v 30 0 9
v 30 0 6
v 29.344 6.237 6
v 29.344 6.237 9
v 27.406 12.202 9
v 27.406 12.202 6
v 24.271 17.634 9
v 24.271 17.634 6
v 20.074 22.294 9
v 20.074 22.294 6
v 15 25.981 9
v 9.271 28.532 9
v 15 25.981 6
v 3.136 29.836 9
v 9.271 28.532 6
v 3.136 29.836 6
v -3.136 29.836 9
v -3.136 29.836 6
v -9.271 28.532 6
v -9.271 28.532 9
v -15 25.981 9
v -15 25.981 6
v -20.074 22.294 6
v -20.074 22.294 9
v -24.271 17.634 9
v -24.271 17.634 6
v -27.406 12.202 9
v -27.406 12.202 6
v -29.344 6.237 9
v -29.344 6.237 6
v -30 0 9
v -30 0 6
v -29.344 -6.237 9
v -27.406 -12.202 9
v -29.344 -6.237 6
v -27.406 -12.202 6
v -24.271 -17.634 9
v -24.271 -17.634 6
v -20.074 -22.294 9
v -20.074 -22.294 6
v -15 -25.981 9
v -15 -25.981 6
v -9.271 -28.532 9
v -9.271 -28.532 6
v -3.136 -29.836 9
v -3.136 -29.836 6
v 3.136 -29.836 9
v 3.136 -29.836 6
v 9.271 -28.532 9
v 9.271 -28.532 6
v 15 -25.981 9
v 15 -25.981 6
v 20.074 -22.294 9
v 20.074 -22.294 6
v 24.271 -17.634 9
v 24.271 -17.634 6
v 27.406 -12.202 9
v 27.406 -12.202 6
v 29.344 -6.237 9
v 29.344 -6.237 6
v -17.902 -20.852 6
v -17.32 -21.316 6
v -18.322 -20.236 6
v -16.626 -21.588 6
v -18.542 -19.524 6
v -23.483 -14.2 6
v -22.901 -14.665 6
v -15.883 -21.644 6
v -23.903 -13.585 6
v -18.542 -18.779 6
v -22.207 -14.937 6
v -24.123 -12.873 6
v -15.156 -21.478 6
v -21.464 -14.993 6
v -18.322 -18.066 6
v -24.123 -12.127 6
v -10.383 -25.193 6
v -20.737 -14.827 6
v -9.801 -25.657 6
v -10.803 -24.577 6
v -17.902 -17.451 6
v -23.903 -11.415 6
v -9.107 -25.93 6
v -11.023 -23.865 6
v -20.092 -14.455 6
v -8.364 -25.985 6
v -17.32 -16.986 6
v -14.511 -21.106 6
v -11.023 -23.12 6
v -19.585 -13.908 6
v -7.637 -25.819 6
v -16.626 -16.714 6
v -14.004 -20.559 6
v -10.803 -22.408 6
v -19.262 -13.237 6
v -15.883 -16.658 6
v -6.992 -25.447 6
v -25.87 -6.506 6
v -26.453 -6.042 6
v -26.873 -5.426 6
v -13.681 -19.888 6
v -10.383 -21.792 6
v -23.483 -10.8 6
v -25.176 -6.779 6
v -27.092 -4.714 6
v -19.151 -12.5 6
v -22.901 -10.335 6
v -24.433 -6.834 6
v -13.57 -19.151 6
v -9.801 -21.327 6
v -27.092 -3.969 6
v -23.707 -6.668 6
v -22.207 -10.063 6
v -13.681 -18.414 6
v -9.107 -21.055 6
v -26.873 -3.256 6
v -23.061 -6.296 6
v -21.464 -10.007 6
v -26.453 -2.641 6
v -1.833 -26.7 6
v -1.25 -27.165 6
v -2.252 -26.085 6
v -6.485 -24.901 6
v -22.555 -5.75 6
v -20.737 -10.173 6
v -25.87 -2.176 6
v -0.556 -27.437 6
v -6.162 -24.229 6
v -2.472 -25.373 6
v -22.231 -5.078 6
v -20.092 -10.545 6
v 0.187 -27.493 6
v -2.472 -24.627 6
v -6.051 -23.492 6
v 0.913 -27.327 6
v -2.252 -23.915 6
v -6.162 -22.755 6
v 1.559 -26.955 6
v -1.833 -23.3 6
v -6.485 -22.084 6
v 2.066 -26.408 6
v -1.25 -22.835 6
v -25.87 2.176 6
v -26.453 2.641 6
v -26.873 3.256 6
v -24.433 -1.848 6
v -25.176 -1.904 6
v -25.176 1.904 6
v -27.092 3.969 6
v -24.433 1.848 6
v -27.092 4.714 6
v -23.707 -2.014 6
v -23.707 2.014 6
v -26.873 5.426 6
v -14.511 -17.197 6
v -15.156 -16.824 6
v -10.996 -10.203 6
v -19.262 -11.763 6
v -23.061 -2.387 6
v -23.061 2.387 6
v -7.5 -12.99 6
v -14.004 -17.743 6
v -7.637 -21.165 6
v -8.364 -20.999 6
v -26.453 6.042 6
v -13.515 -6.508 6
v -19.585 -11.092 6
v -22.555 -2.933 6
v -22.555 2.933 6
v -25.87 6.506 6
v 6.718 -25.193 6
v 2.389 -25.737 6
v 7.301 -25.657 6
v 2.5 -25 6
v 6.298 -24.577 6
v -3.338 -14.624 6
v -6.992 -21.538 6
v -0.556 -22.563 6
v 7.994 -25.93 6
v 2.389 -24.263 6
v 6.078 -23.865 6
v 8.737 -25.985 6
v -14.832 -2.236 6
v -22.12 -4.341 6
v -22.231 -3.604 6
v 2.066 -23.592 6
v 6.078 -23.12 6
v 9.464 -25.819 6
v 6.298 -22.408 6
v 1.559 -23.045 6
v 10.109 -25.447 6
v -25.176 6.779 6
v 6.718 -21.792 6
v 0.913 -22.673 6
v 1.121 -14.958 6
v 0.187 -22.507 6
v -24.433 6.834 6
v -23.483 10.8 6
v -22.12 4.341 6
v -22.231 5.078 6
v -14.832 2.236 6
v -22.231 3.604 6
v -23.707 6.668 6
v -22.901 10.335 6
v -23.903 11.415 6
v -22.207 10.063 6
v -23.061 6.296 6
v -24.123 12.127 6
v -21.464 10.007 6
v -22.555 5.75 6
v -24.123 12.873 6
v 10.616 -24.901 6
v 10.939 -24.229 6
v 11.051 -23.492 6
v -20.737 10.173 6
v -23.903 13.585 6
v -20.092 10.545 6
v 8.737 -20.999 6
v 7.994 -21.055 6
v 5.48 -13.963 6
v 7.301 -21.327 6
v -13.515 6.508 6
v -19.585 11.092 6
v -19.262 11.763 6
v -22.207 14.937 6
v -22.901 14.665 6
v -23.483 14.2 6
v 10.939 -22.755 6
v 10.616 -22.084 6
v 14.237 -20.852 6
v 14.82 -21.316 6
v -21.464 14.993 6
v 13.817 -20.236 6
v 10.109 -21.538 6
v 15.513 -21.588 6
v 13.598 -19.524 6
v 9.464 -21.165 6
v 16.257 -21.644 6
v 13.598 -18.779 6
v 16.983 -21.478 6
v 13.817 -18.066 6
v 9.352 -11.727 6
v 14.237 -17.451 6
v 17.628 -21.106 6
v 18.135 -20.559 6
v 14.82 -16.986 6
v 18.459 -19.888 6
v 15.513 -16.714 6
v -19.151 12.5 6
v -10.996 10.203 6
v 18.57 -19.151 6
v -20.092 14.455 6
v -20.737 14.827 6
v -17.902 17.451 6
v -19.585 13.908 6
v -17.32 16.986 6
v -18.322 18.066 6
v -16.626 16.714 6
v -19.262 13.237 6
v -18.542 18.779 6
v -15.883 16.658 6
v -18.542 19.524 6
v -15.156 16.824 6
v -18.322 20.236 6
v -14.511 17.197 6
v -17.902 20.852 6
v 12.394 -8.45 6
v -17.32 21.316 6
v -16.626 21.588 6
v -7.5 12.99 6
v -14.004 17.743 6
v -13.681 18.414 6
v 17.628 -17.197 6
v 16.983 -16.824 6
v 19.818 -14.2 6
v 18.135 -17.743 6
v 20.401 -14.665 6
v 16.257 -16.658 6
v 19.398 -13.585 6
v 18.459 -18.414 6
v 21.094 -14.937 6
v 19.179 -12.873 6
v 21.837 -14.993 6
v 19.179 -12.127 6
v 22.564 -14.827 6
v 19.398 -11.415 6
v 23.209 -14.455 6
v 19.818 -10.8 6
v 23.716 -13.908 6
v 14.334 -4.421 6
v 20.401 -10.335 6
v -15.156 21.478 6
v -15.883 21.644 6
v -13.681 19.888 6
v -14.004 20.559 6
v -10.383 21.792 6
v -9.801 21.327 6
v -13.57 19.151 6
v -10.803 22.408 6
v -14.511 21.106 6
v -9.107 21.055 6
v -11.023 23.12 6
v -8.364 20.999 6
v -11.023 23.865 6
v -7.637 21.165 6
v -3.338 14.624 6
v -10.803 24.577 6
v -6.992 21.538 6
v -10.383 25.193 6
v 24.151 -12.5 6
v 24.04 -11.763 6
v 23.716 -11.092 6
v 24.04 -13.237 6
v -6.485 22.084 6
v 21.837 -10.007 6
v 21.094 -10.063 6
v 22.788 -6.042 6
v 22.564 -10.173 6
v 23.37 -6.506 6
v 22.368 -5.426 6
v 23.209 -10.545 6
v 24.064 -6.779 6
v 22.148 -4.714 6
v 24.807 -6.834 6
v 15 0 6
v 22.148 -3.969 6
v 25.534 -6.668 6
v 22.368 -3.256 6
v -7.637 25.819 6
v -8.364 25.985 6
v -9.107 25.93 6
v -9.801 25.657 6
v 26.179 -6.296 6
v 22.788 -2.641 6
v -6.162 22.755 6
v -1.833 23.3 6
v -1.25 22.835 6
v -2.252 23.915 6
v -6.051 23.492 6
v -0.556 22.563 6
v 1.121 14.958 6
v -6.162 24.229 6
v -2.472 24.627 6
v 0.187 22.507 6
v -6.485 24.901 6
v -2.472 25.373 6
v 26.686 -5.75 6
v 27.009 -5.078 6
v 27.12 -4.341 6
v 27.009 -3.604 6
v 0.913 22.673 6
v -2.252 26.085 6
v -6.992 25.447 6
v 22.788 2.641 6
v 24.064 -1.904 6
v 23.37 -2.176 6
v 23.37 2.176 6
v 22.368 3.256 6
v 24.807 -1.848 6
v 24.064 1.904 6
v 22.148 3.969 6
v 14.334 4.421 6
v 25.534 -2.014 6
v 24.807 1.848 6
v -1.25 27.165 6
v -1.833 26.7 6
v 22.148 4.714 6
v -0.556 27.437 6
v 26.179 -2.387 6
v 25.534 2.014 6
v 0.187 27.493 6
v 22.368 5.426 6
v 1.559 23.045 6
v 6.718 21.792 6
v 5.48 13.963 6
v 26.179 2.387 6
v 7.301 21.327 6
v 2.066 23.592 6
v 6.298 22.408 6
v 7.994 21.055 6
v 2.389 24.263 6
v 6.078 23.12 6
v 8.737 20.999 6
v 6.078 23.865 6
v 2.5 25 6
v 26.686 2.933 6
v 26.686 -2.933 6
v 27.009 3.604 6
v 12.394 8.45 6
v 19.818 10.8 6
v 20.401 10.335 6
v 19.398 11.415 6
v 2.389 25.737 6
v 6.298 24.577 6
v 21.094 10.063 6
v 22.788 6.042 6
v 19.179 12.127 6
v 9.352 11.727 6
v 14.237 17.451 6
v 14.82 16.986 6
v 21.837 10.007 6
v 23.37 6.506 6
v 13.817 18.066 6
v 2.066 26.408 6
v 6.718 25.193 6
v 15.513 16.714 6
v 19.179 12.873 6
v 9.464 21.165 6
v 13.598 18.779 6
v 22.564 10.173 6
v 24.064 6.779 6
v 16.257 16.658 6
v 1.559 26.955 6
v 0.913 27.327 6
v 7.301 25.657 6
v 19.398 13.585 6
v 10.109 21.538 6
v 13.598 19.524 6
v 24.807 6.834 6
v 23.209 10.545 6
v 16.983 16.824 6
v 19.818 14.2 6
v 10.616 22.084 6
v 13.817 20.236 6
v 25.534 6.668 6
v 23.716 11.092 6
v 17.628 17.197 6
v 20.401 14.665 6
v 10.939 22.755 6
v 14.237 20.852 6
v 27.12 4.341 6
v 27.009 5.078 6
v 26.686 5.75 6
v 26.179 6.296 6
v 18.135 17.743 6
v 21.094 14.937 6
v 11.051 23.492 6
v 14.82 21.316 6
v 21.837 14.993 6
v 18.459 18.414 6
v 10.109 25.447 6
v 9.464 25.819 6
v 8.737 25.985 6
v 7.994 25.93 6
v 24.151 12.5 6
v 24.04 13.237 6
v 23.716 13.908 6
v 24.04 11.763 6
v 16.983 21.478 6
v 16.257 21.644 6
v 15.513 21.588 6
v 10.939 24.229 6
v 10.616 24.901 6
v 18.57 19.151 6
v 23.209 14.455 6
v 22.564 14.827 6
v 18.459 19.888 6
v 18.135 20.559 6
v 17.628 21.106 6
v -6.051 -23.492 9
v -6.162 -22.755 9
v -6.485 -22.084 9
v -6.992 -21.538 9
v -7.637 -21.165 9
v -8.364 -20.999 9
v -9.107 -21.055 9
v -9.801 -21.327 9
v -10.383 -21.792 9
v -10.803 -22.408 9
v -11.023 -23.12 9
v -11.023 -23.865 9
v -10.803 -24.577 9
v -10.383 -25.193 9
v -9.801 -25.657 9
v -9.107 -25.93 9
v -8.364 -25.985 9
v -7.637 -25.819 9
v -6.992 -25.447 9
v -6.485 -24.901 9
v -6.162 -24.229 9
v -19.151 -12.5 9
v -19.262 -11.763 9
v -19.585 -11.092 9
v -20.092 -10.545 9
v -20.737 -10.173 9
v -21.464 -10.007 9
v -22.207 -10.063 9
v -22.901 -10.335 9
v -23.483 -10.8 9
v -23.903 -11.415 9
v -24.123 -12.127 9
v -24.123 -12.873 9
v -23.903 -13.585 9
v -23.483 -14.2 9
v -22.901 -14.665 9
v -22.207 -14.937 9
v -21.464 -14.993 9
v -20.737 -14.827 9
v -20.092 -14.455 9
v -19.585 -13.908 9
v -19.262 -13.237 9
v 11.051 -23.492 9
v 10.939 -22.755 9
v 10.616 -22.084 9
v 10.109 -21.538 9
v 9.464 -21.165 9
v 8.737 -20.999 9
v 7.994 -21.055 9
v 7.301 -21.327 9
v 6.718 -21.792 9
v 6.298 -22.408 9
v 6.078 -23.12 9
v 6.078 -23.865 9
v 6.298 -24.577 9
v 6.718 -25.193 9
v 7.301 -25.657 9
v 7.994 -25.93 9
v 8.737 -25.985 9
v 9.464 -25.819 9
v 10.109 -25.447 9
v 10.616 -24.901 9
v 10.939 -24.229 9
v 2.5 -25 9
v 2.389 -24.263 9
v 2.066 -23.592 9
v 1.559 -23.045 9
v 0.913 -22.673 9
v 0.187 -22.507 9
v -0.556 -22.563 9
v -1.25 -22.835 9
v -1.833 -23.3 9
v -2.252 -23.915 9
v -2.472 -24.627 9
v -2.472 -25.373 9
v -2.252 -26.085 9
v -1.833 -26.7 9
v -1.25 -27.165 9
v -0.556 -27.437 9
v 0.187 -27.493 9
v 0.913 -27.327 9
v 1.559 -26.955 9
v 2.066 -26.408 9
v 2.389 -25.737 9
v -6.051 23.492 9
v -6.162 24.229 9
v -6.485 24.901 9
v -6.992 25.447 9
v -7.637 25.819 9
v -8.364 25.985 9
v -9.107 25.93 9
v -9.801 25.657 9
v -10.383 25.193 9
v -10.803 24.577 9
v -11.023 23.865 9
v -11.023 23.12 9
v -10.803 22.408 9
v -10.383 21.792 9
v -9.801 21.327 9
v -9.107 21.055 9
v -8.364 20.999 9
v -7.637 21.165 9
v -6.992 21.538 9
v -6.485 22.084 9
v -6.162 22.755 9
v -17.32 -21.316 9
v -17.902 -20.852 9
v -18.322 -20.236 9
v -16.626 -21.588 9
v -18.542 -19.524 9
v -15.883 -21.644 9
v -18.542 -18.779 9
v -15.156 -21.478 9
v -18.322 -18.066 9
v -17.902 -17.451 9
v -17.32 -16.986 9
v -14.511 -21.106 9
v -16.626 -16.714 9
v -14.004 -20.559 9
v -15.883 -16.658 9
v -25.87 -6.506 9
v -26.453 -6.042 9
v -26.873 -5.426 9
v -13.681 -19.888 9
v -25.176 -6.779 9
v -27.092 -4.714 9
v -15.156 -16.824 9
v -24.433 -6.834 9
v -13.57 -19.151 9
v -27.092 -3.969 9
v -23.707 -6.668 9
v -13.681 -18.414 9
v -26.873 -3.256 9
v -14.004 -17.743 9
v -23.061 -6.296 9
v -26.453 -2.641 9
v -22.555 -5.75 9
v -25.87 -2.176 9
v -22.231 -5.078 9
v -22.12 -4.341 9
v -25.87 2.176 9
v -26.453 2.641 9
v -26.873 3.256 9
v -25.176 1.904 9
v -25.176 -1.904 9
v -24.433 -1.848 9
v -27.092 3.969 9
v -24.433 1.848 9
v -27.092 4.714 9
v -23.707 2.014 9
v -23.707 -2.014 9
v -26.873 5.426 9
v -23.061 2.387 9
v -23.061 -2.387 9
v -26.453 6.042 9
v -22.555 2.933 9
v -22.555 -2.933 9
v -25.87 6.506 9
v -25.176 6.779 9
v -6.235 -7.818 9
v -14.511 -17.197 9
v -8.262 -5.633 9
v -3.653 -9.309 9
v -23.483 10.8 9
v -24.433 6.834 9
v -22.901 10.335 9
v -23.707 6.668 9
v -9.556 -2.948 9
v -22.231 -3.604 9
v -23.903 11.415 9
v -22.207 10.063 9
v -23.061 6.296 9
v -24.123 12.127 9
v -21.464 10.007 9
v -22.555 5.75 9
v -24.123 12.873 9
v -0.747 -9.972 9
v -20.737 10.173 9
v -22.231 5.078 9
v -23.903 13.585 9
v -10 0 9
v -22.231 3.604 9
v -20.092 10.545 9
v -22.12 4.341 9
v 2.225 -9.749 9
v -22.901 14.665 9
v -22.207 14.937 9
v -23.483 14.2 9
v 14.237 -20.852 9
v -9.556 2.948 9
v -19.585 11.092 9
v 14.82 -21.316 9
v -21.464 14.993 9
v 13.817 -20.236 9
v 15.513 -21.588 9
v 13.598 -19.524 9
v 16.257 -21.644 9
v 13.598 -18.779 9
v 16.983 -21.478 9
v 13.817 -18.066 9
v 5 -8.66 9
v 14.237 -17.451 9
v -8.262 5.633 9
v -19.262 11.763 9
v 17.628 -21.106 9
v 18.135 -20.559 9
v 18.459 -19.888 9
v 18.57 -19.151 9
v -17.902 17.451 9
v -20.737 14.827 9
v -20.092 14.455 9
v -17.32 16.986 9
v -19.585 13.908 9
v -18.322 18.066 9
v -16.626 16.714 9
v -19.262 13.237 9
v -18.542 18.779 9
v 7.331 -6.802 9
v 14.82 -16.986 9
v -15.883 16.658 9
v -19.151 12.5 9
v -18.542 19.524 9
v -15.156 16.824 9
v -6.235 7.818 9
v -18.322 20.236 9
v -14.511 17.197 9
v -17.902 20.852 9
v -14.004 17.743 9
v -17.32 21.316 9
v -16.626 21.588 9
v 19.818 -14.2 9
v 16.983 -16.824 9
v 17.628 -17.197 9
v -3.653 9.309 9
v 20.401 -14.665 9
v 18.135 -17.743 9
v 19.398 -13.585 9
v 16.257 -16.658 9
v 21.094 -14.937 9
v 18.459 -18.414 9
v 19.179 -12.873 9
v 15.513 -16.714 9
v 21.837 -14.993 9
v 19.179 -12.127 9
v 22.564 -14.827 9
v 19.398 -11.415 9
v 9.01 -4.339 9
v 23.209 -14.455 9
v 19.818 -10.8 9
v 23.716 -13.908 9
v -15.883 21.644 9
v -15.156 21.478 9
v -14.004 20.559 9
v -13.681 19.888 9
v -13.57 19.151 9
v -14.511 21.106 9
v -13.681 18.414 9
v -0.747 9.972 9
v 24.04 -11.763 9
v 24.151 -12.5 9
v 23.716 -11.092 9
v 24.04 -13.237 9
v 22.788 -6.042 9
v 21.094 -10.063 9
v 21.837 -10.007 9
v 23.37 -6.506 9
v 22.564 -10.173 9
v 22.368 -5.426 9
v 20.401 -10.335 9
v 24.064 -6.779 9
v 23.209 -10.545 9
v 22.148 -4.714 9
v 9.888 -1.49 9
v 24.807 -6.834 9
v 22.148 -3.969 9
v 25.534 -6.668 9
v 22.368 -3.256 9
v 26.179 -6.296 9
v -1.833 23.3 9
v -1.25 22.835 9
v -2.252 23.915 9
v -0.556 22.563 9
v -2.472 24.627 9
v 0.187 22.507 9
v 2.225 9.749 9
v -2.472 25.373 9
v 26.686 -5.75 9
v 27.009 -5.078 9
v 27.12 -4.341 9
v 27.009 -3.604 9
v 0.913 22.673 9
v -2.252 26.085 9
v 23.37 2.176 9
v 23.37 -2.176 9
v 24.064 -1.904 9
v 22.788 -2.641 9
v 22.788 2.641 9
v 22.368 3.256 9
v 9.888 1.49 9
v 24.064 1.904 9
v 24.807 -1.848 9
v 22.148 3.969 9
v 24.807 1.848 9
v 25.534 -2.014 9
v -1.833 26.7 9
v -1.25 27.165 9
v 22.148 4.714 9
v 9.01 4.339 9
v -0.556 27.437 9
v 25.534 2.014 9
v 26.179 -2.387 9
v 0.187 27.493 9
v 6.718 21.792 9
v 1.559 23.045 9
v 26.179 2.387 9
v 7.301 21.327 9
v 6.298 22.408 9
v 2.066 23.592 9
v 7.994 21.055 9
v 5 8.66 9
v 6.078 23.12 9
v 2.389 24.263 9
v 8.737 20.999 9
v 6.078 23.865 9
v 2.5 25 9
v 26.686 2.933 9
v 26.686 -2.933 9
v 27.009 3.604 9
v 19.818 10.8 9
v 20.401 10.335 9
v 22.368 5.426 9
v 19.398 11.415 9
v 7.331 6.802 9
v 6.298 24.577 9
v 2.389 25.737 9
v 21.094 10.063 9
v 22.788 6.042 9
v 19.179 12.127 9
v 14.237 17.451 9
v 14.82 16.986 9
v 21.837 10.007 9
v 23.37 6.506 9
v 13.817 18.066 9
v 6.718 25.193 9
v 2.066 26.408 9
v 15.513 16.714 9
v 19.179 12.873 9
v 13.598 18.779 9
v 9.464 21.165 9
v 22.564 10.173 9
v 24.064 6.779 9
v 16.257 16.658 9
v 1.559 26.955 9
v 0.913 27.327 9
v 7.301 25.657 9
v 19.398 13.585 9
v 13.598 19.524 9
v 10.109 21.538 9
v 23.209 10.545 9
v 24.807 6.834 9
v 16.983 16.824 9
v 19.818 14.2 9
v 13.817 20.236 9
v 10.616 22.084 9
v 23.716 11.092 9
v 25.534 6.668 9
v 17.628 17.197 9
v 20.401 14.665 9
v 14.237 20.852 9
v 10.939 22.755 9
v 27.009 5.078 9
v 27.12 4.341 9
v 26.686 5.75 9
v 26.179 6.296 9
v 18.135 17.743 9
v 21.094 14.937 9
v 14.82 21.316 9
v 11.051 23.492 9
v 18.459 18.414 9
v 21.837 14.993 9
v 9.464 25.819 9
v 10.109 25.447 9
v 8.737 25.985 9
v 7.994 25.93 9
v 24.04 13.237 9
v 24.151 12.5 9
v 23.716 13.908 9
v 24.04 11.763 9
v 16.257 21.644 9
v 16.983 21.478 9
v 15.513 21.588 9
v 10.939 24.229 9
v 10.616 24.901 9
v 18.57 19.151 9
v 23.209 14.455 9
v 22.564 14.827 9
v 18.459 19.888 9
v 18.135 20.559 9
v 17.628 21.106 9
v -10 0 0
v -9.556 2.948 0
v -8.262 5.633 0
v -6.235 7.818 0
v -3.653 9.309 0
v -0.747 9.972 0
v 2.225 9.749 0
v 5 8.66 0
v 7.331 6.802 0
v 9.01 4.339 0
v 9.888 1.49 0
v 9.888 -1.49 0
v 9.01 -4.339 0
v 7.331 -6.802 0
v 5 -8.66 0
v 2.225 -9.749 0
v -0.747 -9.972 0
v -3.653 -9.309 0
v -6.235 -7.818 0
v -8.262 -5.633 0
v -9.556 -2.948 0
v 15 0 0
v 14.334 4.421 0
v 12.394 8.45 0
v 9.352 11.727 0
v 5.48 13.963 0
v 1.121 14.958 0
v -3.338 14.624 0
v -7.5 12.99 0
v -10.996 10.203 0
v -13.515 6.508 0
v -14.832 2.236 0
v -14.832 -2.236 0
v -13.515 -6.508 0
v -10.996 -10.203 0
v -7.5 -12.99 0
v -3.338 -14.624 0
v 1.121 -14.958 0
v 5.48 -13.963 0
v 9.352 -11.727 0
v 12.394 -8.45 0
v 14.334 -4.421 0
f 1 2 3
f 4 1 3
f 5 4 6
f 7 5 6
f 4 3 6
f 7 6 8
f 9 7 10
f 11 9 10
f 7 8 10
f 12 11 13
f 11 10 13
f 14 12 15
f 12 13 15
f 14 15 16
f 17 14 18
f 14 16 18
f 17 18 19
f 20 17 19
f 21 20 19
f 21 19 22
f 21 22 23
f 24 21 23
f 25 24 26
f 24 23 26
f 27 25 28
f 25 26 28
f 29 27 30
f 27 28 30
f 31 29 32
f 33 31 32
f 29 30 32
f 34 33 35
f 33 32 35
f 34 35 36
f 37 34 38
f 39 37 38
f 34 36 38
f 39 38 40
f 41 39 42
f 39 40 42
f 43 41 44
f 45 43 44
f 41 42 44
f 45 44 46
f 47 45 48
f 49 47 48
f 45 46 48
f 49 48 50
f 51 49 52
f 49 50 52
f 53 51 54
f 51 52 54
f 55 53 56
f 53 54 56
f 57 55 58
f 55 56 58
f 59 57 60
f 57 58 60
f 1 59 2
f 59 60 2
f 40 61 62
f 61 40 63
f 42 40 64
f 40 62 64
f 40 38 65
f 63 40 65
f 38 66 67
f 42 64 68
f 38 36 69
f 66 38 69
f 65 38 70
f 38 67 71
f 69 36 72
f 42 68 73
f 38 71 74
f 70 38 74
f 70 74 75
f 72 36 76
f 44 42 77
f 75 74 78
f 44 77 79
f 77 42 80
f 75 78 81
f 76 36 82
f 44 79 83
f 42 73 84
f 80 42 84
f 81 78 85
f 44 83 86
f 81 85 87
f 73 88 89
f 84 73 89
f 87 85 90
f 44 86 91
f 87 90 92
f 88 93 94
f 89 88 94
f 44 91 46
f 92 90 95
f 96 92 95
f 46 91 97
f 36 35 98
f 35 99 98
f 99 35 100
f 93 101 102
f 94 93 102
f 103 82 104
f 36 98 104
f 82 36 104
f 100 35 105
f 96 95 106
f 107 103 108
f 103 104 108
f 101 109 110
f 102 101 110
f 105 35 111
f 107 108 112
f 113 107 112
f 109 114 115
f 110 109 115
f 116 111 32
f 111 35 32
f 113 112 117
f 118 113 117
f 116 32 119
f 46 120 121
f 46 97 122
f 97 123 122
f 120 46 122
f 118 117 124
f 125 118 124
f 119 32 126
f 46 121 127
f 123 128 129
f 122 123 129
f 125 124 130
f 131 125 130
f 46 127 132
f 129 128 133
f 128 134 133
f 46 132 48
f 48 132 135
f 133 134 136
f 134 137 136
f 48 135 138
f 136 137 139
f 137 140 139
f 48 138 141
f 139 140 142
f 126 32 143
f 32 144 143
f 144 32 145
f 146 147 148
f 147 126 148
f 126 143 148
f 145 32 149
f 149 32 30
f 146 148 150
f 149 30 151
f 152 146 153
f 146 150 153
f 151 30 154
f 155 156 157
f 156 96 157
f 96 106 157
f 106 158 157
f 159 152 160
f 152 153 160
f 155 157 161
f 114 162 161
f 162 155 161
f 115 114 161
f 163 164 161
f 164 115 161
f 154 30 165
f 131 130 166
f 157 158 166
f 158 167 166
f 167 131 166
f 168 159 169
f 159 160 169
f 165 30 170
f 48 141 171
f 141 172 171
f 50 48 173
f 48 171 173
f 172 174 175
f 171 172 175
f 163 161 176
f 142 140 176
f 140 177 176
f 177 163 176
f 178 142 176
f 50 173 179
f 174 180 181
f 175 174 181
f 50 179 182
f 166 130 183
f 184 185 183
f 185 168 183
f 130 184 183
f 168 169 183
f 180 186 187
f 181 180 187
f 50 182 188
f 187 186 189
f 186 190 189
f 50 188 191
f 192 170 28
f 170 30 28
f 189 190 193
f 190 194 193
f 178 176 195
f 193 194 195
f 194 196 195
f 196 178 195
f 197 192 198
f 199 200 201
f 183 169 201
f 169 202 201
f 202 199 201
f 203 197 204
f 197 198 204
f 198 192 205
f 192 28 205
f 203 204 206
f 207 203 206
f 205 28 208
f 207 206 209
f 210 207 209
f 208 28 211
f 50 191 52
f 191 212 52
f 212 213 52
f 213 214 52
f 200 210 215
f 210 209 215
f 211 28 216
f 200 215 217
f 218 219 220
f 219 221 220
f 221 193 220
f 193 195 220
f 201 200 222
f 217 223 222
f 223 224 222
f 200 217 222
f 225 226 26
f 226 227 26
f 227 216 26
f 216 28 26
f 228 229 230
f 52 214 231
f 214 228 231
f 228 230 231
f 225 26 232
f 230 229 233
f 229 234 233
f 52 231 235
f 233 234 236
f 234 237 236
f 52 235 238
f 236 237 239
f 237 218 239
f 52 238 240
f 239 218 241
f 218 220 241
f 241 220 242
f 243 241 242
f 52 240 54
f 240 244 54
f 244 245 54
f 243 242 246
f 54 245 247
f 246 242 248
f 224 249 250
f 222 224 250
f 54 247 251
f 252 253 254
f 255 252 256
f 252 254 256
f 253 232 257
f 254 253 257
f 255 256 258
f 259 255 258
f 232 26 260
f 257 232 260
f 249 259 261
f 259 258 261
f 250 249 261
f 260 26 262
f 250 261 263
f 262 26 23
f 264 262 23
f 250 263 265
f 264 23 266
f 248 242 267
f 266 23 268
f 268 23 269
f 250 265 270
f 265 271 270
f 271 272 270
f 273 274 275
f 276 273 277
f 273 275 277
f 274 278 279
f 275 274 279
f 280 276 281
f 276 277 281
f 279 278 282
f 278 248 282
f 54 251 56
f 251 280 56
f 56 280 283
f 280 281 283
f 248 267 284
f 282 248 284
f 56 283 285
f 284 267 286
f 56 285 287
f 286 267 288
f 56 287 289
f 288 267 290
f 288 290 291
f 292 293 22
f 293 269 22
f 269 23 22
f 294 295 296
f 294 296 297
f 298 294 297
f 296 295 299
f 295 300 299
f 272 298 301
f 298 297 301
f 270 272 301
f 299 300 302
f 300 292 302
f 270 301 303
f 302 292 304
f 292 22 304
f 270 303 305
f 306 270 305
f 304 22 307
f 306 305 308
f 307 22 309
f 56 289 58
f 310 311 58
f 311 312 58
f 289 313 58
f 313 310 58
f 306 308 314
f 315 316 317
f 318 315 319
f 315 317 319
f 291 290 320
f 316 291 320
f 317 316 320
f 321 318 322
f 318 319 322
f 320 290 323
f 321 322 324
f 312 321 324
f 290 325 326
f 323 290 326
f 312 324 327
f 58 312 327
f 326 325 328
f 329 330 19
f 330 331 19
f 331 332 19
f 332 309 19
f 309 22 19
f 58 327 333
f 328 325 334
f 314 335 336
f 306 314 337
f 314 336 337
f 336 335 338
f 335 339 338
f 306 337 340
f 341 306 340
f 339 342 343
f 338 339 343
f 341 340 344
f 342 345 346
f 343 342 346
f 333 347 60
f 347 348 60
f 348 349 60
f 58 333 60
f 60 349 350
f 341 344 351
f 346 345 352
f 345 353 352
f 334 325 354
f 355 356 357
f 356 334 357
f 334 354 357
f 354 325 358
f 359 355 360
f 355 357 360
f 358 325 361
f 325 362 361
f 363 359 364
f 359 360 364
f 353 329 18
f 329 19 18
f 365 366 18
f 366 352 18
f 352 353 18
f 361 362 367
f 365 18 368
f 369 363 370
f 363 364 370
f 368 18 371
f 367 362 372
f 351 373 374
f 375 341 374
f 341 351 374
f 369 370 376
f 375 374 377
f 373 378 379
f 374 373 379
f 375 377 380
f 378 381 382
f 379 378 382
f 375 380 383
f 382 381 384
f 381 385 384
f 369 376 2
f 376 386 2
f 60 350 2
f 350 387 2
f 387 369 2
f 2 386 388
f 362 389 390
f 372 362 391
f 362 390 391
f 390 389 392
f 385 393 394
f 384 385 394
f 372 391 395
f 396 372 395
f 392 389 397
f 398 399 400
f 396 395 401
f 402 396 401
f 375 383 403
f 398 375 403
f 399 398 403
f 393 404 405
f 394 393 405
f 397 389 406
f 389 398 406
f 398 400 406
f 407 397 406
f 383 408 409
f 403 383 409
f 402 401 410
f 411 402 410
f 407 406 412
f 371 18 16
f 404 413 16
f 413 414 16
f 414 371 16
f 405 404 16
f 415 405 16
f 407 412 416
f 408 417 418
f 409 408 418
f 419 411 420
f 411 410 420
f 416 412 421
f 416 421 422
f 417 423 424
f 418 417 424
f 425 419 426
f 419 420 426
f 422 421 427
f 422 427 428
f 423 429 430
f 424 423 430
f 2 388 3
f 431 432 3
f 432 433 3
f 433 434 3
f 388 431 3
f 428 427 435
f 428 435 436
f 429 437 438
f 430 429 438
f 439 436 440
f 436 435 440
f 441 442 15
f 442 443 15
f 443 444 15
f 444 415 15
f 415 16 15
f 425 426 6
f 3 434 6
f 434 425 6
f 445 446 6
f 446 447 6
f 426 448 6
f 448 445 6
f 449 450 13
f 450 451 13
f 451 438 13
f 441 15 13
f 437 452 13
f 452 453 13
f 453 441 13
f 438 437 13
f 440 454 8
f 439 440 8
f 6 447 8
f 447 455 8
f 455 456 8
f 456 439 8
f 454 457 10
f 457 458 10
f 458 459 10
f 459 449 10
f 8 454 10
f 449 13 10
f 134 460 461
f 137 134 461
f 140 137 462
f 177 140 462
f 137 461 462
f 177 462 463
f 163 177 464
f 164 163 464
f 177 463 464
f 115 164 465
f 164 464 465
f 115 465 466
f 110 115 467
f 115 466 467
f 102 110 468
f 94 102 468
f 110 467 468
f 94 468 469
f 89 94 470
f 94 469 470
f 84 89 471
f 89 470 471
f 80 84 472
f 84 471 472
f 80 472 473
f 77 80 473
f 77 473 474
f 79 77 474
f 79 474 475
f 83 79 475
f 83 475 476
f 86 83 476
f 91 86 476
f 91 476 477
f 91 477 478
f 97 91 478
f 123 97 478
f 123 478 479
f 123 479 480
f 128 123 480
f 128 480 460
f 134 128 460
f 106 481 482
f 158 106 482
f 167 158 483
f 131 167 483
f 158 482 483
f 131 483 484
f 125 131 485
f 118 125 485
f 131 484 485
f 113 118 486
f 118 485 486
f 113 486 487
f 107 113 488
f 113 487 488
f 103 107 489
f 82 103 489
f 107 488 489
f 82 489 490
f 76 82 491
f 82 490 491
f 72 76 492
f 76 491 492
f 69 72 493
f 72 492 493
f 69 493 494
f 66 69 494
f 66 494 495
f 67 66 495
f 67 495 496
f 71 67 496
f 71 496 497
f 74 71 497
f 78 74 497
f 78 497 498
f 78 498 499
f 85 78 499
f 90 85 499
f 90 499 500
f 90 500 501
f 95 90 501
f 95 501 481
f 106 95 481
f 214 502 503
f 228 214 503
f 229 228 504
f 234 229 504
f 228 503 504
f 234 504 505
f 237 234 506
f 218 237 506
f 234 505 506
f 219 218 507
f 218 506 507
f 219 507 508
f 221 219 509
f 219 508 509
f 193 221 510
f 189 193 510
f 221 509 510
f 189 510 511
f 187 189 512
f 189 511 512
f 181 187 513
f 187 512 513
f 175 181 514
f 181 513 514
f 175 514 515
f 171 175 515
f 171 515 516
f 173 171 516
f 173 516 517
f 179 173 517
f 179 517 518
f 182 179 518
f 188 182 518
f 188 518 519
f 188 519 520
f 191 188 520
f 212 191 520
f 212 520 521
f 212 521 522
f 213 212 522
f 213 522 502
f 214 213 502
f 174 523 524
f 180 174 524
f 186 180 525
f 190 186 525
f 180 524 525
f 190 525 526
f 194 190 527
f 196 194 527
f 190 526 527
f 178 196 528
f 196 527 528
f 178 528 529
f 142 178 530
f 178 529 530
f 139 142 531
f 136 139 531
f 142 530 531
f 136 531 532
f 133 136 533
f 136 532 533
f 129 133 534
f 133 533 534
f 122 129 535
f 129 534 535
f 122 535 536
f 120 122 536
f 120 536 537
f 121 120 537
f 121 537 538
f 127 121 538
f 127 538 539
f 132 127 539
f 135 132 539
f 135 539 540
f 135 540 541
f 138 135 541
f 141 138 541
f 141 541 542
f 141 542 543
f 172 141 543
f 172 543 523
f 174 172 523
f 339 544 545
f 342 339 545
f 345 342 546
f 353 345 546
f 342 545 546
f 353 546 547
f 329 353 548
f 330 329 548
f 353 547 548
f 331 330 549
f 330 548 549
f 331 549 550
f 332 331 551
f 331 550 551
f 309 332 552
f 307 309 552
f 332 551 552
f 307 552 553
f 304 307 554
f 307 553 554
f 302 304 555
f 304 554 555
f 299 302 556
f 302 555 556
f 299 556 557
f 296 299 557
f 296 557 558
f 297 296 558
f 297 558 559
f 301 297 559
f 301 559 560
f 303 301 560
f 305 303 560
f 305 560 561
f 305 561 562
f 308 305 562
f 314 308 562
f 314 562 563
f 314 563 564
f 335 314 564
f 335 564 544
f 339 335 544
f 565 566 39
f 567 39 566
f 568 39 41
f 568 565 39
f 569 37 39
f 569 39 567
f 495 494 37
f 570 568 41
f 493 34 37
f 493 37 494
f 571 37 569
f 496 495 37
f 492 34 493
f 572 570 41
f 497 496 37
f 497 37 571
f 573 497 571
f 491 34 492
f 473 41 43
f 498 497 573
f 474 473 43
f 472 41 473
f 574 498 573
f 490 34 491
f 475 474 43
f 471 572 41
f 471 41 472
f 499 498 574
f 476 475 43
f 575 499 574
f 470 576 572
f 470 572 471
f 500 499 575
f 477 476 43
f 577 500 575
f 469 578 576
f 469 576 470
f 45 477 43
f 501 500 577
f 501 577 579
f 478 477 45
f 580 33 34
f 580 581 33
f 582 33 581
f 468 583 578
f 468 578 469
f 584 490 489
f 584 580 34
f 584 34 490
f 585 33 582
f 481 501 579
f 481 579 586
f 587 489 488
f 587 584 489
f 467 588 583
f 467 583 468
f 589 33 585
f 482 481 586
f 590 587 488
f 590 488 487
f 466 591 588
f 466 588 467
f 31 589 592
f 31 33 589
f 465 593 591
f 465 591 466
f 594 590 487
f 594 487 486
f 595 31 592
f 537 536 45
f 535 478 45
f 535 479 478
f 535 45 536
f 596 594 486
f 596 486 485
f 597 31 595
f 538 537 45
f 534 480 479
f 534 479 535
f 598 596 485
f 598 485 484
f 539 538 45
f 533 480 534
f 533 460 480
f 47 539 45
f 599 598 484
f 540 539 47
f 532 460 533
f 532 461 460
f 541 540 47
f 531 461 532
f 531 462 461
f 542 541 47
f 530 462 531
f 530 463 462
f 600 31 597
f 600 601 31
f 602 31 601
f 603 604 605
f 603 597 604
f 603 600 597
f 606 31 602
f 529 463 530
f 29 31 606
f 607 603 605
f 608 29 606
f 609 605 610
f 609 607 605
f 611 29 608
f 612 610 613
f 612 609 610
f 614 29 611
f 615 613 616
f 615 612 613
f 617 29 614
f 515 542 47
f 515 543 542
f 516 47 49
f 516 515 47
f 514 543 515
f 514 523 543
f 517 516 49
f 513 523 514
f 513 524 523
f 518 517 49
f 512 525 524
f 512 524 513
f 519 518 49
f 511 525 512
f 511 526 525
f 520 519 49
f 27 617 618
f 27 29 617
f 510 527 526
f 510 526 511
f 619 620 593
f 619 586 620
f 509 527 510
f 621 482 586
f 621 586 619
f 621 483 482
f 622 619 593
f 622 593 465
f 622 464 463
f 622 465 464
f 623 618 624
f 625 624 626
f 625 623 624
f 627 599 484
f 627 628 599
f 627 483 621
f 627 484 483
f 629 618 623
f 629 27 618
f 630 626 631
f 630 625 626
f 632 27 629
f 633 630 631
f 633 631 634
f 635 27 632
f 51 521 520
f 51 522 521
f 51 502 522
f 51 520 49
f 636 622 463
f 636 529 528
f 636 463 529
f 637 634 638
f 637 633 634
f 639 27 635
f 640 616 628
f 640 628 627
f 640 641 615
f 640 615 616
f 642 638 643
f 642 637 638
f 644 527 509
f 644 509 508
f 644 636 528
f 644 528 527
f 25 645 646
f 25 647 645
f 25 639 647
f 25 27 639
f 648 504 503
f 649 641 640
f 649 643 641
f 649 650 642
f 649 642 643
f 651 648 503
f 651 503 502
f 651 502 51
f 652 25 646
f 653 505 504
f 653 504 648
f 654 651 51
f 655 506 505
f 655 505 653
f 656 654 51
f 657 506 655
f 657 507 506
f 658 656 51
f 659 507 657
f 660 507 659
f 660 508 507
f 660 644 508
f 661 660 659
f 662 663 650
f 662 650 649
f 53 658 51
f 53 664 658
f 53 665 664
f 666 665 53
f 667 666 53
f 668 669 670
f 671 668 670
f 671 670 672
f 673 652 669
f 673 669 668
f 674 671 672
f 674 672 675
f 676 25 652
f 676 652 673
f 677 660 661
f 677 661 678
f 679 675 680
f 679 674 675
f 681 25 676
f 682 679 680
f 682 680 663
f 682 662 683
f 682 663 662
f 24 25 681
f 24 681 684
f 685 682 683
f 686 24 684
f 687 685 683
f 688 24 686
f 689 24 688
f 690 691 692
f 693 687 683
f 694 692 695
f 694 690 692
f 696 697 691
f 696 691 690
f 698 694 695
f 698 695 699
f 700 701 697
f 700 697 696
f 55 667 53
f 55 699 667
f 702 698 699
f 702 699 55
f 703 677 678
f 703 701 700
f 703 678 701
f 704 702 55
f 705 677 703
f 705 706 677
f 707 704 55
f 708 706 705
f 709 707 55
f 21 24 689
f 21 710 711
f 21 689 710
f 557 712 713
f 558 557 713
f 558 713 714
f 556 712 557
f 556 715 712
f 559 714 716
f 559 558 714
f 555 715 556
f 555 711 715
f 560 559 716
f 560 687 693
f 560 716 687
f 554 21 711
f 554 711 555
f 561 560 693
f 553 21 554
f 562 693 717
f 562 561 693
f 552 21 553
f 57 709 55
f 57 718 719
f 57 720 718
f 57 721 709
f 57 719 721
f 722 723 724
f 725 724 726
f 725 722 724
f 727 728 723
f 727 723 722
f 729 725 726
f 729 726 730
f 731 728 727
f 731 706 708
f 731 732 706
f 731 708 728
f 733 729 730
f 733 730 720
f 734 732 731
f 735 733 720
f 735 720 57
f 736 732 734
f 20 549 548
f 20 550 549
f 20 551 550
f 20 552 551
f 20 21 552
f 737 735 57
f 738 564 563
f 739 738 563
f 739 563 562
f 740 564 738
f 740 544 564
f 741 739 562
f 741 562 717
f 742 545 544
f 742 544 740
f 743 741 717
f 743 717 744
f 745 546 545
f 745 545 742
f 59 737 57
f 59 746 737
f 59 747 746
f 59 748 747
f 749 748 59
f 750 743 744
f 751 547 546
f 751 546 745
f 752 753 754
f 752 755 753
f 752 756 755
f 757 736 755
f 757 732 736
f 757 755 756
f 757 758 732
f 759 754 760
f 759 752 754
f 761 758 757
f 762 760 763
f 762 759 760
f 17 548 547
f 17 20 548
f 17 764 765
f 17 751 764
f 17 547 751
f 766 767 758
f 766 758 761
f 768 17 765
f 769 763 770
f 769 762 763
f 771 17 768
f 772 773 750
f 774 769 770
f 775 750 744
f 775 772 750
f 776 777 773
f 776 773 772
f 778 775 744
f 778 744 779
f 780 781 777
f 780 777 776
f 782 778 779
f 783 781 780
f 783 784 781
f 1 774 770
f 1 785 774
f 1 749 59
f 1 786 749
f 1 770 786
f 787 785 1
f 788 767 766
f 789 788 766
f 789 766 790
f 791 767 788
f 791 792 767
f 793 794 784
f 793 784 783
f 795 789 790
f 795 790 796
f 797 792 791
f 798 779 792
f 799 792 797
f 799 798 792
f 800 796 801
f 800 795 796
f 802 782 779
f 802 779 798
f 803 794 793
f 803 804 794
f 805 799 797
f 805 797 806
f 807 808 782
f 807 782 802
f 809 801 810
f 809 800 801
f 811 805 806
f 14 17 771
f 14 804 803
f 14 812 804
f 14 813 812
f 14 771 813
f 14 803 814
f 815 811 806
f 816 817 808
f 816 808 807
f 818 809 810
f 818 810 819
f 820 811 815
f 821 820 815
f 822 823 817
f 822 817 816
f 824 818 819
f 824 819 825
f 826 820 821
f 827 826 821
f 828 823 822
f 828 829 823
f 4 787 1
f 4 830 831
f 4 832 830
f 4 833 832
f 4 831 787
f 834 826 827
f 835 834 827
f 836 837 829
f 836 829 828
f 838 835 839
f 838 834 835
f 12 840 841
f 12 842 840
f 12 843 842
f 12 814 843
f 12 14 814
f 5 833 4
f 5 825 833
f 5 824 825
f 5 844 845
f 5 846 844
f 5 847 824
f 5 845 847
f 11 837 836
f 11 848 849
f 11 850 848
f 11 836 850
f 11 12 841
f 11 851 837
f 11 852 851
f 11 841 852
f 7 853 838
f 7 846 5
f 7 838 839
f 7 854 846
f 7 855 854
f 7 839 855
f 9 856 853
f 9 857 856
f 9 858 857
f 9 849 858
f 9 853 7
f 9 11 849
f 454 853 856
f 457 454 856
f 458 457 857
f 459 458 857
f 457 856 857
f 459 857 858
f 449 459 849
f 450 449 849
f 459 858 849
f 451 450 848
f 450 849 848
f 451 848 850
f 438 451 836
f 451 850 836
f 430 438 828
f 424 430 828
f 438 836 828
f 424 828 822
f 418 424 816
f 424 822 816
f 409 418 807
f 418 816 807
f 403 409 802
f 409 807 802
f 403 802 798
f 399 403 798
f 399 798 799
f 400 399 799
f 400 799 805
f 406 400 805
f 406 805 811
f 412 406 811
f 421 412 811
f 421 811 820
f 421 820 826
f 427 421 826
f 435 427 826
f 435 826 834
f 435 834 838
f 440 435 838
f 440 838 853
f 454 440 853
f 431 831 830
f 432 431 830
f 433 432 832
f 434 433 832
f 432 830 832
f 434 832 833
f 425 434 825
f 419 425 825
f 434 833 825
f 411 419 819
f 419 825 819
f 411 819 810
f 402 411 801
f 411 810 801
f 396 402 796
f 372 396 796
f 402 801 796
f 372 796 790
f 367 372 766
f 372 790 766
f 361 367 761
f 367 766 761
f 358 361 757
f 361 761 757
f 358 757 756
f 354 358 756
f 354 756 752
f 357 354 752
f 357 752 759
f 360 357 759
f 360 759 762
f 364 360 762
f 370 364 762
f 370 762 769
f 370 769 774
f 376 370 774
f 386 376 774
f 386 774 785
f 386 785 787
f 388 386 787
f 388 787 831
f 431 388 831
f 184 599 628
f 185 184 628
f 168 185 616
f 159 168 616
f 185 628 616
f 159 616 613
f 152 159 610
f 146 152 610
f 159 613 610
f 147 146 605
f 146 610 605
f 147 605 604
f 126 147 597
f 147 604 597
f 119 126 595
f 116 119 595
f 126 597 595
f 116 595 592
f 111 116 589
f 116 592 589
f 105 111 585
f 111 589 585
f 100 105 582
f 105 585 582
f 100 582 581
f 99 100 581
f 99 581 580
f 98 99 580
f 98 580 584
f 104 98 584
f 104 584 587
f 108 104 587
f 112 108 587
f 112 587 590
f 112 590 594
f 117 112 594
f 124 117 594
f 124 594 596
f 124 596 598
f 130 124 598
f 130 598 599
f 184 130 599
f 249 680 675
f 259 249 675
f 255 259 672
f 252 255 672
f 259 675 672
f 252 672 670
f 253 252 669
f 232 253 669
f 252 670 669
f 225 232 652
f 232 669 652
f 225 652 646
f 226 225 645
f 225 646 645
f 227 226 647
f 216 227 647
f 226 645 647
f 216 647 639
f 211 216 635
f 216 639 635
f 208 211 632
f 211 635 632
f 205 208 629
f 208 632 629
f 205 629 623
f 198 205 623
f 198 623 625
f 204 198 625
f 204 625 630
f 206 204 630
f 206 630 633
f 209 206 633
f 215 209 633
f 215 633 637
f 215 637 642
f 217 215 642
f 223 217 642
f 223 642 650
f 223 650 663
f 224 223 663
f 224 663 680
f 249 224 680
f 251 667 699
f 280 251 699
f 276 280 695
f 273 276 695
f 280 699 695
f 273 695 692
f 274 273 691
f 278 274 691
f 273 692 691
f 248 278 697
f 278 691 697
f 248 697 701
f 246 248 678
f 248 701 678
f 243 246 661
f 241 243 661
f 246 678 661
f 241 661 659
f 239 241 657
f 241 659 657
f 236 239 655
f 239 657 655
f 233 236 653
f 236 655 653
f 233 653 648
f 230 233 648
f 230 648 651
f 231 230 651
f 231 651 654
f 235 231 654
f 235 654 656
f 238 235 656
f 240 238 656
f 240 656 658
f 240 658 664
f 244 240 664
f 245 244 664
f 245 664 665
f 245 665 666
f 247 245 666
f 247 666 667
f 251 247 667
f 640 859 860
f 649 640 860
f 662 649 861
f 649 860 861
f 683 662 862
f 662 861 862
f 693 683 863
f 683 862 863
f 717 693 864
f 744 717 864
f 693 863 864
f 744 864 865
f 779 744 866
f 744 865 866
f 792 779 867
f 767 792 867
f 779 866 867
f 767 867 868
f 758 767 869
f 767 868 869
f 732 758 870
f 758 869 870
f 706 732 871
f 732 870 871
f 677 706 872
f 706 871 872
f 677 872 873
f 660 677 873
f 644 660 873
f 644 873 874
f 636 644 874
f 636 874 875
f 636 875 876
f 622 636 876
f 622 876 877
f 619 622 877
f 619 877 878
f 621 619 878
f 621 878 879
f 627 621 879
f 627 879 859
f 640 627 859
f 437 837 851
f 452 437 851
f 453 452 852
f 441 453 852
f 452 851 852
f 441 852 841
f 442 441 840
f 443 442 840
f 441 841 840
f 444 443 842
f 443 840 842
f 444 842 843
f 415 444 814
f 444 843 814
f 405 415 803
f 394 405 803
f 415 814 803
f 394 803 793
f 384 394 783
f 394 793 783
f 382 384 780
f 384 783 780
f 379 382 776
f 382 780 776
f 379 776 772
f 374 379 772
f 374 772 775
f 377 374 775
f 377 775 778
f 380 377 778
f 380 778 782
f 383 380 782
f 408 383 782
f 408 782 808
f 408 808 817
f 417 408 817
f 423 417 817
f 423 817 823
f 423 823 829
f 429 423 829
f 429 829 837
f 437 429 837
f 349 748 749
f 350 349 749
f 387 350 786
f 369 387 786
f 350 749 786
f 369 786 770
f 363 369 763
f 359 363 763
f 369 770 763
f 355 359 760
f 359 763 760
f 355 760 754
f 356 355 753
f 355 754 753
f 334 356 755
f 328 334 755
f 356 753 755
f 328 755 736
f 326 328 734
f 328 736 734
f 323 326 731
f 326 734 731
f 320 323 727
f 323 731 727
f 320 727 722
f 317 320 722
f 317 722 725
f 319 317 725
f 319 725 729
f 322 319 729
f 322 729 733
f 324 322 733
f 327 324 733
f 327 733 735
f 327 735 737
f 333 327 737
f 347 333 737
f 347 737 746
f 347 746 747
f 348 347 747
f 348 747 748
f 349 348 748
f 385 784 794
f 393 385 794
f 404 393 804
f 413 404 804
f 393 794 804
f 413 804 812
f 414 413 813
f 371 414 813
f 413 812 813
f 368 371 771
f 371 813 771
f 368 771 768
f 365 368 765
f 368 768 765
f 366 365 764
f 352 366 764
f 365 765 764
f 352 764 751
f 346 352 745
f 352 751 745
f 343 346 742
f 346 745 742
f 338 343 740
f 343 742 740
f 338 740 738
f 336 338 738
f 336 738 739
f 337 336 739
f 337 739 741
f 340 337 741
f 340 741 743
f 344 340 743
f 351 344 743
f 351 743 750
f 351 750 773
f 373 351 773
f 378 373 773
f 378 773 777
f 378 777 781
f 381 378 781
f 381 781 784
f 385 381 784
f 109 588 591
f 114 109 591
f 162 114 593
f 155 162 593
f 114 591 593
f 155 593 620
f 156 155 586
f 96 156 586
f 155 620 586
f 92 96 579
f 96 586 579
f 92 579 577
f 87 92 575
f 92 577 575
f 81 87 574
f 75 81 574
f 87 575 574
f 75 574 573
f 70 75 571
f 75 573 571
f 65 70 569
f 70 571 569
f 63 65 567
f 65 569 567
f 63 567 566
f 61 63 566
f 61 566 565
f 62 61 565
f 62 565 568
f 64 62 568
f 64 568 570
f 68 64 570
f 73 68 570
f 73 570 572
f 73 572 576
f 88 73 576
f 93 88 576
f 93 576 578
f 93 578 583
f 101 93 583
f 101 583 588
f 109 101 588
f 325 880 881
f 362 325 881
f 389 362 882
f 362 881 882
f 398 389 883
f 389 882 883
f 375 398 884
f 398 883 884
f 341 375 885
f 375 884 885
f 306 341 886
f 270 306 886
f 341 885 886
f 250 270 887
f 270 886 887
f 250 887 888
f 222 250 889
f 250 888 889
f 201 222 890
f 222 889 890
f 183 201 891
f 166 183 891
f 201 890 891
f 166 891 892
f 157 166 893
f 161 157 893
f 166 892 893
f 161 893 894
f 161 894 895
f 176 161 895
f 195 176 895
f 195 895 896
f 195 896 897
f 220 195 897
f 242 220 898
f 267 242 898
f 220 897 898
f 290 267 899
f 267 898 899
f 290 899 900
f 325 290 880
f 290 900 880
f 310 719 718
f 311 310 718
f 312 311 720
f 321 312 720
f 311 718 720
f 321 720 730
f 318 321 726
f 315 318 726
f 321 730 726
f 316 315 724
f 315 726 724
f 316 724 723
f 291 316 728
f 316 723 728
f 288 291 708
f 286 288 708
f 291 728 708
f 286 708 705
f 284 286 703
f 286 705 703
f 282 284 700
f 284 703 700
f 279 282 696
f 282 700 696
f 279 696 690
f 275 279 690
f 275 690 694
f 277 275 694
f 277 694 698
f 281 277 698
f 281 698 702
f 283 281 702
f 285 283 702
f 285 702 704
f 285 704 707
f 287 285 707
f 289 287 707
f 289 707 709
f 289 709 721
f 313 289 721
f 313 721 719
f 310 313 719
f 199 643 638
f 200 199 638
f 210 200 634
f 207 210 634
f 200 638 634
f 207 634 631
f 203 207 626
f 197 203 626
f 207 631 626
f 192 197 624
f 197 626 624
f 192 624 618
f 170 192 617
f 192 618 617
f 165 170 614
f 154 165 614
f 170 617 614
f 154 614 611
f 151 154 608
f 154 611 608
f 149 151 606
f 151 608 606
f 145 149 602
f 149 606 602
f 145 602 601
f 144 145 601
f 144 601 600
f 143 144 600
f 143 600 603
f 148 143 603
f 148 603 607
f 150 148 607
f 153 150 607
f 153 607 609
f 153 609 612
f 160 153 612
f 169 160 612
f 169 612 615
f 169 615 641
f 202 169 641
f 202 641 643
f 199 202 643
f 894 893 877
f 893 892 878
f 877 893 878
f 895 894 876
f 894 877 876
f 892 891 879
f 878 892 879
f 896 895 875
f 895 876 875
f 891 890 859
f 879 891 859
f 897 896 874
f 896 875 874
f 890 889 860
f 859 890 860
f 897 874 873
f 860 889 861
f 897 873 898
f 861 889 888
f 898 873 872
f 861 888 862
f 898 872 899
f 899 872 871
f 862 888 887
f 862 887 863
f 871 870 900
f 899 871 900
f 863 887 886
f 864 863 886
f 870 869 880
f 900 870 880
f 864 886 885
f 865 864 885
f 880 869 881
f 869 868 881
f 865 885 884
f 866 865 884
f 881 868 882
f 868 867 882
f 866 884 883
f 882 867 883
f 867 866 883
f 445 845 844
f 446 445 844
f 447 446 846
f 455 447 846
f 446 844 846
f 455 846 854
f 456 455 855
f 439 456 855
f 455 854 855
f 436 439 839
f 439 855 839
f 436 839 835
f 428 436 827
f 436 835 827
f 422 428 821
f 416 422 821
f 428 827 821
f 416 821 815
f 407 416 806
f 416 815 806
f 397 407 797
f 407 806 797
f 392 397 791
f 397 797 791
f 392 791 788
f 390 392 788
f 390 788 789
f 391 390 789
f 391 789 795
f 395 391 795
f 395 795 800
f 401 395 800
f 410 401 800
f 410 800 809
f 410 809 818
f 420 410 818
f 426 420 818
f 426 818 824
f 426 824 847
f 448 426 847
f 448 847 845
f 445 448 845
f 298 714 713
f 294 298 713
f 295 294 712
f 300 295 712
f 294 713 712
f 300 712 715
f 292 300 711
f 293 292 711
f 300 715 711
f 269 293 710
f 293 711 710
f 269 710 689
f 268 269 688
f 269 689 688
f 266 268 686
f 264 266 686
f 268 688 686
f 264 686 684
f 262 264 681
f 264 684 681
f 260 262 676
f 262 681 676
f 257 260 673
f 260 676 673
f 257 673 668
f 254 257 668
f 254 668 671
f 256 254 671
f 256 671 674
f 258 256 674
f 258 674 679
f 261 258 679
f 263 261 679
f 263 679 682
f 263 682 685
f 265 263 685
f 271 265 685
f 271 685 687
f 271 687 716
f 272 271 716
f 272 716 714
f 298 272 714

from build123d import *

# Parameters (mm, degrees)
SKETCH1_R           = 15
BOSS_EXTRUDE1_DEPTH = 6
SKETCH2_R           = 30
BOSS_EXTRUDE2_DEPTH = 3
SKETCH5_R           = 10
CUT_EXTRUDE2_DEPTH  = 44.370496884
SKETCH8_R           = 2.5
CUT_EXTRUDE3_DEPTH  = 44.370496884


with BuildPart() as part:
    # Sketch1 → Boss-Extrude1 (new body)
    with BuildSketch(Plane.XY):
        Circle(SKETCH1_R)
    extrude(amount=BOSS_EXTRUDE1_DEPTH)

    # Sketch2 → Boss-Extrude2 (add)
    with BuildSketch(Plane.XY.offset(6)):
        Circle(SKETCH2_R)
    extrude(amount=BOSS_EXTRUDE2_DEPTH)

    # Sketch5 → Cut-Extrude2 (cut, through all)
    with BuildSketch(Plane(origin=(0, 0, 0), x_dir=(-1, 0, 0), z_dir=(0, 0, -1))):
        Circle(SKETCH5_R)
    extrude(amount=-CUT_EXTRUDE2_DEPTH, mode=Mode.SUBTRACT)

    # Sketch8 → Cut-Extrude3 (cut, through all)
    with BuildSketch(Plane.XY.offset(9)):
        with Locations((0, 25)):
            Circle(SKETCH8_R)
        with Locations((8.550503583, 23.49231552)):
            Circle(SKETCH8_R)
        with Locations((16.069690242, 19.151111078)):
            Circle(SKETCH8_R)
        with Locations((21.650635095, 12.5)):
            Circle(SKETCH8_R)
        with Locations((24.620193825, 4.341204442)):
            Circle(SKETCH8_R)
        with Locations((24.620193825, -4.341204442)):
            Circle(SKETCH8_R)
        with Locations((21.650635095, -12.5)):
            Circle(SKETCH8_R)
        with Locations((16.069690242, -19.151111078)):
            Circle(SKETCH8_R)
        with Locations((8.550503583, -23.49231552)):
            Circle(SKETCH8_R)
        with Locations((0, -25)):
            Circle(SKETCH8_R)
        with Locations((-8.550503583, -23.49231552)):
            Circle(SKETCH8_R)
        with Locations((-16.069690242, -19.151111078)):
            Circle(SKETCH8_R)
        with Locations((-21.650635095, -12.5)):
            Circle(SKETCH8_R)
        with Locations((-24.620193825, -4.341204442)):
            Circle(SKETCH8_R)
        with Locations((-24.620193825, 4.341204442)):
            Circle(SKETCH8_R)
        with Locations((-21.650635095, 12.5)):
            Circle(SKETCH8_R)
        with Locations((-16.069690242, 19.151111078)):
            Circle(SKETCH8_R)
        with Locations((-8.550503583, 23.49231552)):
            Circle(SKETCH8_R)
    extrude(amount=-CUT_EXTRUDE3_DEPTH, mode=Mode.SUBTRACT)


solid = part.part
